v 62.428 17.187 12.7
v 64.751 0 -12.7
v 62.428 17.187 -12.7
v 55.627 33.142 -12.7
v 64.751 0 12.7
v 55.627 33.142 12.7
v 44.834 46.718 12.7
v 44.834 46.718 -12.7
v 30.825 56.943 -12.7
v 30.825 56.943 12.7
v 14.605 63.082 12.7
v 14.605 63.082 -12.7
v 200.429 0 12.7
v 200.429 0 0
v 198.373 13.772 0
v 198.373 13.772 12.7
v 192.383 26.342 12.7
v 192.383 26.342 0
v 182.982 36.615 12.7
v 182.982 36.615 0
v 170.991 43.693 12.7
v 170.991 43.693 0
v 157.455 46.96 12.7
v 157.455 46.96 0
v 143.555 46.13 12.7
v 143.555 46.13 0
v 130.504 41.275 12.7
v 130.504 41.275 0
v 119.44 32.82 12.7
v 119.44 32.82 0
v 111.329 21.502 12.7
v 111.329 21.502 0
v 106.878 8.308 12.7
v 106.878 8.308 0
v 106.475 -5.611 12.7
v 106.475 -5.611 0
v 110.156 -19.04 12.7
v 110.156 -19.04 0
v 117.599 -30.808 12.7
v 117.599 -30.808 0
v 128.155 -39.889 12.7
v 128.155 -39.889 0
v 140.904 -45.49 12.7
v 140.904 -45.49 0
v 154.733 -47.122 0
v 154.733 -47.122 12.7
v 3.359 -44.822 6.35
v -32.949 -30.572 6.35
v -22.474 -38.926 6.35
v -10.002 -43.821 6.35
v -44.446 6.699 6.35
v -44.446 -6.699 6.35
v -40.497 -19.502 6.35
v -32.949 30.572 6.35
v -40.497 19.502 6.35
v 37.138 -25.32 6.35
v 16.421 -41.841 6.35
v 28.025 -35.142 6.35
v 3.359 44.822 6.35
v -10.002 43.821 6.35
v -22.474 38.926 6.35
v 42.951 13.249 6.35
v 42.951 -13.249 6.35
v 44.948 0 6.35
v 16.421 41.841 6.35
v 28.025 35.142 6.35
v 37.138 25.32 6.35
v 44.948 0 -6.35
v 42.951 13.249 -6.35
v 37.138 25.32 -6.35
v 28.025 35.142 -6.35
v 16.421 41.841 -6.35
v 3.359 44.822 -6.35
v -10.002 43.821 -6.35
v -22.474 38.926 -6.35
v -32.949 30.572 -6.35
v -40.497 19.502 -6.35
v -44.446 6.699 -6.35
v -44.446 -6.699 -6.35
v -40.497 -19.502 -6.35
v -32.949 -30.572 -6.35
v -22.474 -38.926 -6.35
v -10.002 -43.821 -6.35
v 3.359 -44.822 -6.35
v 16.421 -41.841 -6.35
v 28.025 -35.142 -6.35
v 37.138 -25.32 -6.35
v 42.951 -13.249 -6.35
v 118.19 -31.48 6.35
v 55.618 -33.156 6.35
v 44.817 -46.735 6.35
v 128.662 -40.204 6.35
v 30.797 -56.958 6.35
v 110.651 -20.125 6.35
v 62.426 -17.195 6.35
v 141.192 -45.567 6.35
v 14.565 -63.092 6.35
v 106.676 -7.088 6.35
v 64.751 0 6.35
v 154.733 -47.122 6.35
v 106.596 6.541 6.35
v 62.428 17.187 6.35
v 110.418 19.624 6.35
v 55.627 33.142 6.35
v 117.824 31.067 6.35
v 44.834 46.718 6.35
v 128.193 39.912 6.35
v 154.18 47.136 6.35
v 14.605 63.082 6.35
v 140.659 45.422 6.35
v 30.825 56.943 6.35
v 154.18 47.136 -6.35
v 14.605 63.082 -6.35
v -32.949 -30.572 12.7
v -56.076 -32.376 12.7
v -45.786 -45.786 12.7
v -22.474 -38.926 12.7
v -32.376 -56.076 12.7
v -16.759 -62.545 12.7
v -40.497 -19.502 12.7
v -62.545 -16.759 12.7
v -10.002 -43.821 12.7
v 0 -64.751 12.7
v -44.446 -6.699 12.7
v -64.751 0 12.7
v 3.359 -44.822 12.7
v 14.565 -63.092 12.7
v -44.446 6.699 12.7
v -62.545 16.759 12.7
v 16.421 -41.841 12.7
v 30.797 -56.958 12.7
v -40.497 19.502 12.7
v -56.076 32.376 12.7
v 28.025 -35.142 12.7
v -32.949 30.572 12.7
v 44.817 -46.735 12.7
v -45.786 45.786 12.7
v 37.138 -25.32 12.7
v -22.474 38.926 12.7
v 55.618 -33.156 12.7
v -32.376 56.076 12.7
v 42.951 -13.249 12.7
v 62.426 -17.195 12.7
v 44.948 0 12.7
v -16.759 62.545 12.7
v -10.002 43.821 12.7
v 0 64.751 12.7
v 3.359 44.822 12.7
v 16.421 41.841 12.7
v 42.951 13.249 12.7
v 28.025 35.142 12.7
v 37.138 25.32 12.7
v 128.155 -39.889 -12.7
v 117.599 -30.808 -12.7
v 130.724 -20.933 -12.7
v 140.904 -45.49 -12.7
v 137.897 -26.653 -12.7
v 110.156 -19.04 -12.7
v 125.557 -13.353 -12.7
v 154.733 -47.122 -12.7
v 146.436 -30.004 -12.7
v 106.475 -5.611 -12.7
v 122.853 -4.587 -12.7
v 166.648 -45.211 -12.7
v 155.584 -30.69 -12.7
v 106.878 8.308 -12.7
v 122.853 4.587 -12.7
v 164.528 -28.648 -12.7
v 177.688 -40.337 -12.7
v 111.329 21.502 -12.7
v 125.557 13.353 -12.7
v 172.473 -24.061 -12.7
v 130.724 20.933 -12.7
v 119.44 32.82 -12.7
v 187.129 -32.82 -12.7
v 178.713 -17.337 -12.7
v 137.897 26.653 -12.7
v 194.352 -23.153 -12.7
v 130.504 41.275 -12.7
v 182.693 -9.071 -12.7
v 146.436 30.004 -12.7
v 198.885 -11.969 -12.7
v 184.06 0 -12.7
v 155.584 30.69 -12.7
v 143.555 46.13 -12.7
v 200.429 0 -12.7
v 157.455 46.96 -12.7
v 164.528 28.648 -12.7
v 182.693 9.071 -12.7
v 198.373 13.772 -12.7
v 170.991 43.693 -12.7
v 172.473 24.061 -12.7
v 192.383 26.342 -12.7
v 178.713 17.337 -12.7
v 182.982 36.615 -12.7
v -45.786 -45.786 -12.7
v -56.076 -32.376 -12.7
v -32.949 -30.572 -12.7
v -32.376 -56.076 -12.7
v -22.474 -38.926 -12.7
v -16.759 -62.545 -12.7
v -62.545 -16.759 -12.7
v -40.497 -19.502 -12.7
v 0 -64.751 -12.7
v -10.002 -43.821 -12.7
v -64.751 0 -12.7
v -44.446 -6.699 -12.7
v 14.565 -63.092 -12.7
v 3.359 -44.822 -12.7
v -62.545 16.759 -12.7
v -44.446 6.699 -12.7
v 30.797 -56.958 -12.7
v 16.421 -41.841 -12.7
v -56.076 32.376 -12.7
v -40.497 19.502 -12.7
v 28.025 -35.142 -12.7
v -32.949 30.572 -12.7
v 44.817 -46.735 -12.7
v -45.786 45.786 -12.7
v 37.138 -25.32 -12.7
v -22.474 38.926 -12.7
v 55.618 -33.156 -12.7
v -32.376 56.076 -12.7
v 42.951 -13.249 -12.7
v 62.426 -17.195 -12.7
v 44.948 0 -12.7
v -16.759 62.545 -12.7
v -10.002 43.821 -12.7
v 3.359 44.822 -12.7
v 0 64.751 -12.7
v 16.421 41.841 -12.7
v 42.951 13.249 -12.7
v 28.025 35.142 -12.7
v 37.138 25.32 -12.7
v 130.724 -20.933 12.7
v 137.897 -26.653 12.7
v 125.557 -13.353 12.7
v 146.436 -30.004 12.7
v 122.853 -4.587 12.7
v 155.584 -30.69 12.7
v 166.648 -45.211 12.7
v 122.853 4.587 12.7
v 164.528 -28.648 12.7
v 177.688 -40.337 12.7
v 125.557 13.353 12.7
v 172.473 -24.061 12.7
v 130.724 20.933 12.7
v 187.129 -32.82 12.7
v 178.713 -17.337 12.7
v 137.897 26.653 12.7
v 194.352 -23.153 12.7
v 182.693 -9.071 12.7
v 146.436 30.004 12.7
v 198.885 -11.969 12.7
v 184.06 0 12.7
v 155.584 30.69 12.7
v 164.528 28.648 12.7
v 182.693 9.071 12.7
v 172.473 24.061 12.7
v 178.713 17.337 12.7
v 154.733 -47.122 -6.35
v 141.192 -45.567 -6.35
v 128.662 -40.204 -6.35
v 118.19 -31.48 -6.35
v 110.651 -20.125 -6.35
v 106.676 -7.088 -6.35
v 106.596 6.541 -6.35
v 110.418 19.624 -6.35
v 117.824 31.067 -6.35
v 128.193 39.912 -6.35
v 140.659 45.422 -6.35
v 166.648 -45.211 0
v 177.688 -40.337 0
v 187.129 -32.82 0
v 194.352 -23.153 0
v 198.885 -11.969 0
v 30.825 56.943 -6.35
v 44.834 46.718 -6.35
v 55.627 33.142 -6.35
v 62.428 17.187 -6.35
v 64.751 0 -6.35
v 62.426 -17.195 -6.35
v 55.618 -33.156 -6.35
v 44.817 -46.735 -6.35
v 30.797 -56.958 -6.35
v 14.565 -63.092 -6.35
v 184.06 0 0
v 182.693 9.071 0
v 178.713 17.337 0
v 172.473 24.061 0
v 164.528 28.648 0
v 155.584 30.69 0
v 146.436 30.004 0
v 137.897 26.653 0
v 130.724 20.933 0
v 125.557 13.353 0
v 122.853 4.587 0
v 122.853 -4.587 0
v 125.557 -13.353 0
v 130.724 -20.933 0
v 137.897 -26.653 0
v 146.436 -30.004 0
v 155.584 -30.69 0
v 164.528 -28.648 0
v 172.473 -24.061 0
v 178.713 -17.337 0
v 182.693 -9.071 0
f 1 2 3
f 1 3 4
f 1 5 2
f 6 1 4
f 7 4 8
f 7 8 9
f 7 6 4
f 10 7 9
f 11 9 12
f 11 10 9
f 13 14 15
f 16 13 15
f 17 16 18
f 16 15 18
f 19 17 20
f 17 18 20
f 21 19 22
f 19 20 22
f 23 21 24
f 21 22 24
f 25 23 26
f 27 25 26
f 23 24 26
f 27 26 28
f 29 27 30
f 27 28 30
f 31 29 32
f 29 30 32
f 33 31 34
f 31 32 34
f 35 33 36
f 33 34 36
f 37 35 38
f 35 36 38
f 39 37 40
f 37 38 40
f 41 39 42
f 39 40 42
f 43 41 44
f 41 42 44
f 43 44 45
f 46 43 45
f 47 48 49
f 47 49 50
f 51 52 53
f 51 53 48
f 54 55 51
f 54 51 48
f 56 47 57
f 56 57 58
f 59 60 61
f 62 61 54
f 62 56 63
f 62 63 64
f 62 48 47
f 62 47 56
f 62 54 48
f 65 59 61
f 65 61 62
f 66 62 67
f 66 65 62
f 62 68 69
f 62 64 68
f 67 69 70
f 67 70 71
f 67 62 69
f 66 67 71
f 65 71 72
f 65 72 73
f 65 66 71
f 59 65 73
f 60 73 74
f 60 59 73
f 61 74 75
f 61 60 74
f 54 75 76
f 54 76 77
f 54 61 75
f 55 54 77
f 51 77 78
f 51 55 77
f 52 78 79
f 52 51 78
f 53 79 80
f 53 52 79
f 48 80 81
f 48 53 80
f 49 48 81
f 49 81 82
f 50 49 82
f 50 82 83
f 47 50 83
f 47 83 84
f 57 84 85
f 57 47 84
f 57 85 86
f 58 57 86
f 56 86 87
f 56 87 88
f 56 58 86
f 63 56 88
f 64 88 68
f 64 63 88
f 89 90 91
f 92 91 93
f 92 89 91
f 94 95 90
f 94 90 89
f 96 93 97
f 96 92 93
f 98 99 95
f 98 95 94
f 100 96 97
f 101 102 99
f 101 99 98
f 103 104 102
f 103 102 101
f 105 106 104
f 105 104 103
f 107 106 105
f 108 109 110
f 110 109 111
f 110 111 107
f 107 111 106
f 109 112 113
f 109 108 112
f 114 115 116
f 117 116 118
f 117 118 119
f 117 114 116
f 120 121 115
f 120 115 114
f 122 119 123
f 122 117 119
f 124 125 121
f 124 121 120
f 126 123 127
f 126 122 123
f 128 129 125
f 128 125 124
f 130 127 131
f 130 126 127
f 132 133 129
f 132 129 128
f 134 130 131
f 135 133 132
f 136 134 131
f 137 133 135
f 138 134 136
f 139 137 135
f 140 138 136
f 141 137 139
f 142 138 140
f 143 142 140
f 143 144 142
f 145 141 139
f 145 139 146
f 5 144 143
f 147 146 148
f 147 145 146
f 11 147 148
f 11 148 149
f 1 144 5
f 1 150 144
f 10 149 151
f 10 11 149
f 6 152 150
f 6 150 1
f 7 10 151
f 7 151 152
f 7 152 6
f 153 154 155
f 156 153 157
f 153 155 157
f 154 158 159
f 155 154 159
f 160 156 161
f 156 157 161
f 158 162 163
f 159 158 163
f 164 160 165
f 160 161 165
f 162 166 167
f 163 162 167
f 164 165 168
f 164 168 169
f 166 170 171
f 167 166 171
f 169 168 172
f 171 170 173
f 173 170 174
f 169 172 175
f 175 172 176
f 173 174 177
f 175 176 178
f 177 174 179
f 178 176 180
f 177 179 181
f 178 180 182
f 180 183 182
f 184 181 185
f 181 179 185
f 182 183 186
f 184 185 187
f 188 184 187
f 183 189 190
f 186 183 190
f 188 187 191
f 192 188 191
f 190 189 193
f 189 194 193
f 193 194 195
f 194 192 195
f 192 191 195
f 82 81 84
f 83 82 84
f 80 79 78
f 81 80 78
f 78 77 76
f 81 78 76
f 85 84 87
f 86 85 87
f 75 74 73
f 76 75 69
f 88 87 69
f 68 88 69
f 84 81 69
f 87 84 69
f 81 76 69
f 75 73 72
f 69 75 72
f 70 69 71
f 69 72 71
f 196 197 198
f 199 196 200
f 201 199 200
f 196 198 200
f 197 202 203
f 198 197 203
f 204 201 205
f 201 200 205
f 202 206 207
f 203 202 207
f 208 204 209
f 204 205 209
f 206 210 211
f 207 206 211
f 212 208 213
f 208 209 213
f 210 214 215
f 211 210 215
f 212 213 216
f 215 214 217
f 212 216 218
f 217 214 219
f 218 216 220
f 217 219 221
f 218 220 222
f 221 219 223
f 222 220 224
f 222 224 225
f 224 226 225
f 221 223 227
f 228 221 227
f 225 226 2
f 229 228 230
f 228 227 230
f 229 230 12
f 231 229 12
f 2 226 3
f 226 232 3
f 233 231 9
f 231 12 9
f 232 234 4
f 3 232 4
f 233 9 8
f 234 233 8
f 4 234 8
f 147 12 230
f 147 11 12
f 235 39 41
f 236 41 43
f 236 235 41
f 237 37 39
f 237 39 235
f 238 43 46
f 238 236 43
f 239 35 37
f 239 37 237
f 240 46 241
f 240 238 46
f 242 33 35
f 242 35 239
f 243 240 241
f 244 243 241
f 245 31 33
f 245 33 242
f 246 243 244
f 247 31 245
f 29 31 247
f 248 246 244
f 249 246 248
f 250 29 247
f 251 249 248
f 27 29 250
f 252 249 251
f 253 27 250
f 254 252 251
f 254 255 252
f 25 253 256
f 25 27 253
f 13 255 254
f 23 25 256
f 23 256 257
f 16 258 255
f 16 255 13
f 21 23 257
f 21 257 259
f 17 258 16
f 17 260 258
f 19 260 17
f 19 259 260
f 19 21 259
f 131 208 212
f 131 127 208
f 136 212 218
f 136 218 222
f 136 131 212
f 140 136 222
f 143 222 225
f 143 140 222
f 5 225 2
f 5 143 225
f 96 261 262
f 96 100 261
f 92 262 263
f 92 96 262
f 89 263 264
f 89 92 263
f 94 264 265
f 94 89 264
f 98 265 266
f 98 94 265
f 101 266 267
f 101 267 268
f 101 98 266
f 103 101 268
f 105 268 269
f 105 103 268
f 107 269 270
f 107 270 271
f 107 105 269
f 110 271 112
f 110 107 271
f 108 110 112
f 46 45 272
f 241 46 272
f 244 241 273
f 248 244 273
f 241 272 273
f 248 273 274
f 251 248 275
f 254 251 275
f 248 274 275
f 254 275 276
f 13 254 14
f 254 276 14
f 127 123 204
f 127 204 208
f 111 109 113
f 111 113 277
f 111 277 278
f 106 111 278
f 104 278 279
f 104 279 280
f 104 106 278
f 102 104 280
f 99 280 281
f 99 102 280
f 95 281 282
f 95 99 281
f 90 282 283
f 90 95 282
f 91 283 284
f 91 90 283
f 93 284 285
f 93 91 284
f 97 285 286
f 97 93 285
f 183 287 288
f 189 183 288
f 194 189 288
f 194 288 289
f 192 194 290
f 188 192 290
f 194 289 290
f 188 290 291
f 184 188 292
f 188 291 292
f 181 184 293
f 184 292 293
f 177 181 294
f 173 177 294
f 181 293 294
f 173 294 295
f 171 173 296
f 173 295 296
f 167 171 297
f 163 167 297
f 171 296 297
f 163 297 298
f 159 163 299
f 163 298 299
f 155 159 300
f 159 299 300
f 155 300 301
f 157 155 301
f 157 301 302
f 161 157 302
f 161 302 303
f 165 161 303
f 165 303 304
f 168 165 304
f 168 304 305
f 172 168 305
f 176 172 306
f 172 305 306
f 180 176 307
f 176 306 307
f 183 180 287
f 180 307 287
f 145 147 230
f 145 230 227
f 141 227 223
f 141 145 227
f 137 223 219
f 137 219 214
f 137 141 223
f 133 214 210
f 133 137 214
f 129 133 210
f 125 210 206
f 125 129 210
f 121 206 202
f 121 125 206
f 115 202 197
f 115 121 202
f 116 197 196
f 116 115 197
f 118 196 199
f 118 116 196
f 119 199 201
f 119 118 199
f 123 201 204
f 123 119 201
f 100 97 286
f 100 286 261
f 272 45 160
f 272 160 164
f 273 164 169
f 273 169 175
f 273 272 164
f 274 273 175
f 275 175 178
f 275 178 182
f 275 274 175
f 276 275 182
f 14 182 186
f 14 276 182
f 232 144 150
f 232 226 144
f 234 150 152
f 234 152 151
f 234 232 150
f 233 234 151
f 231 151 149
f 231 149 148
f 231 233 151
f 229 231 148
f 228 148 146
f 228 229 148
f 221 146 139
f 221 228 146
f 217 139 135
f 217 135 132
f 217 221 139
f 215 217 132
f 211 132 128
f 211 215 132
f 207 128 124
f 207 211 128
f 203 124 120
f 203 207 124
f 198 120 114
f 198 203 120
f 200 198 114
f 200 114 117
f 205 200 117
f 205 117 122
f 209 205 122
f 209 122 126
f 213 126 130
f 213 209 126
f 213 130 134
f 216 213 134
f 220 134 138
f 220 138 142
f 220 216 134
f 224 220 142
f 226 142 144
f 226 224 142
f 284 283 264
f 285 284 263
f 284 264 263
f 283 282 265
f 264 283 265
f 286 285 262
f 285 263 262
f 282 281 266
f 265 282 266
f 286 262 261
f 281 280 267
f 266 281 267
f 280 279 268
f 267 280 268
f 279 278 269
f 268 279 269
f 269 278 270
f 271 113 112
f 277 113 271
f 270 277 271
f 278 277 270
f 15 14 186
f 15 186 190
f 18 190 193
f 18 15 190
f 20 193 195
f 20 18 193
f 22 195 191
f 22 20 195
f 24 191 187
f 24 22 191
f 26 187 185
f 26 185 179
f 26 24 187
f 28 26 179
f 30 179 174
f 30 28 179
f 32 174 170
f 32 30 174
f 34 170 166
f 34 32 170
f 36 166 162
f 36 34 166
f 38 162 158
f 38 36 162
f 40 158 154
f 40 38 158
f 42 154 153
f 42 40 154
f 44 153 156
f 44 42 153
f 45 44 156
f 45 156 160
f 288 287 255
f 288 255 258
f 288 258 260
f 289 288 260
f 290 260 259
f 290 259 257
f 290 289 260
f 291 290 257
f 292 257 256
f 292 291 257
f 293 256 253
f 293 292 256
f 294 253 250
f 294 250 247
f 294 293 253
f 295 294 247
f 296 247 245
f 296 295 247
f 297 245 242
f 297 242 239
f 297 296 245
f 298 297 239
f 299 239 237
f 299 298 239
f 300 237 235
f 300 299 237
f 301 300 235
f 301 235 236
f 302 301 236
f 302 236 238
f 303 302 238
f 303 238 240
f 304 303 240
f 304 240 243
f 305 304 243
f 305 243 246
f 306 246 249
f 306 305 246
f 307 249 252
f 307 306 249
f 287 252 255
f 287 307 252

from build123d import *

# Parameters (mm, degrees)
F0_R     = 44.9480270959
F1_DEPTH = 12.7
F0_R_2   = 30.775716183
F2_DEPTH = 6.35


with BuildPart() as f1:
    # F0 (on Top) → F1 (new body, symmetric)
    with BuildSketch(Plane.XY):
        with BuildLine():
            Line((14.6048909022, 63.0824442065), (0, 64.751043276))
            ThreePointArc((0, 64.751043276), (-64.751043276, 0), (0, -64.751043276))
            Line((0, -64.751043276), (14.5651541935, -63.0916308923))
            ThreePointArc((14.5651541935, -63.0916308923), (50.6744833956, -40.3087377365), (64.751043276, 0))
            ThreePointArc((64.751043276, 0), (50.6871755387, 40.2927765392), (14.6048909022, 63.0824442065))
        make_face()
        Circle(F0_R, mode=Mode.SUBTRACT)
    extrude(amount=F1_DEPTH, both=True)


with BuildPart() as f1b:
    # F0 (on Top) → F1, piece 2 (new body, symmetric)
    with BuildSketch(Plane.XY):
        with BuildLine():
            ThreePointArc((200.4291468306, 0), (186.9360305833, 33.0180203257), (154.1803392628, 47.1360420854))
            ThreePointArc((154.1803392628, 47.1360420854), (106.1408512327, -0.2762262139), (154.7326209823, -47.1223093808))
            ThreePointArc((154.7326209823, -47.1223093808), (187.128909941, -32.8202853277), (200.4291468306, 0))
        make_face()
        with Locations((153.2845944166, 0)):
            Circle(F0_R_2, mode=Mode.SUBTRACT)
    extrude(amount=F1_DEPTH, both=True)


with BuildPart() as f2:
    # F0 (on Top) → F2 (new body, symmetric)
    with BuildSketch(Plane.XY):
        with BuildLine():
            Line((154.1803392628, 47.1360420854), (14.6048909022, 63.0824442065))
            ThreePointArc((14.6048909022, 63.0824442065), (50.6871755387, 40.2927765392), (64.751043276, 0))
            ThreePointArc((64.751043276, 0), (50.6744833956, -40.3087377365), (14.5651541935, -63.0916308923))
            Line((14.5651541935, -63.0916308923), (154.7326209823, -47.1223093808))
            ThreePointArc((154.7326209823, -47.1223093808), (106.1408512327, -0.2762262139), (154.1803392628, 47.1360420854))
        make_face()
    extrude(amount=F2_DEPTH, both=True)


with BuildPart() as f2b:
    # F0 (on Top) → F2, piece 2 (new body, symmetric)
    with BuildSketch(Plane.XY):
        Circle(F0_R)
    extrude(amount=F2_DEPTH, both=True)


solid = Compound([f1.part, f1b.part, f2.part, f2b.part])
